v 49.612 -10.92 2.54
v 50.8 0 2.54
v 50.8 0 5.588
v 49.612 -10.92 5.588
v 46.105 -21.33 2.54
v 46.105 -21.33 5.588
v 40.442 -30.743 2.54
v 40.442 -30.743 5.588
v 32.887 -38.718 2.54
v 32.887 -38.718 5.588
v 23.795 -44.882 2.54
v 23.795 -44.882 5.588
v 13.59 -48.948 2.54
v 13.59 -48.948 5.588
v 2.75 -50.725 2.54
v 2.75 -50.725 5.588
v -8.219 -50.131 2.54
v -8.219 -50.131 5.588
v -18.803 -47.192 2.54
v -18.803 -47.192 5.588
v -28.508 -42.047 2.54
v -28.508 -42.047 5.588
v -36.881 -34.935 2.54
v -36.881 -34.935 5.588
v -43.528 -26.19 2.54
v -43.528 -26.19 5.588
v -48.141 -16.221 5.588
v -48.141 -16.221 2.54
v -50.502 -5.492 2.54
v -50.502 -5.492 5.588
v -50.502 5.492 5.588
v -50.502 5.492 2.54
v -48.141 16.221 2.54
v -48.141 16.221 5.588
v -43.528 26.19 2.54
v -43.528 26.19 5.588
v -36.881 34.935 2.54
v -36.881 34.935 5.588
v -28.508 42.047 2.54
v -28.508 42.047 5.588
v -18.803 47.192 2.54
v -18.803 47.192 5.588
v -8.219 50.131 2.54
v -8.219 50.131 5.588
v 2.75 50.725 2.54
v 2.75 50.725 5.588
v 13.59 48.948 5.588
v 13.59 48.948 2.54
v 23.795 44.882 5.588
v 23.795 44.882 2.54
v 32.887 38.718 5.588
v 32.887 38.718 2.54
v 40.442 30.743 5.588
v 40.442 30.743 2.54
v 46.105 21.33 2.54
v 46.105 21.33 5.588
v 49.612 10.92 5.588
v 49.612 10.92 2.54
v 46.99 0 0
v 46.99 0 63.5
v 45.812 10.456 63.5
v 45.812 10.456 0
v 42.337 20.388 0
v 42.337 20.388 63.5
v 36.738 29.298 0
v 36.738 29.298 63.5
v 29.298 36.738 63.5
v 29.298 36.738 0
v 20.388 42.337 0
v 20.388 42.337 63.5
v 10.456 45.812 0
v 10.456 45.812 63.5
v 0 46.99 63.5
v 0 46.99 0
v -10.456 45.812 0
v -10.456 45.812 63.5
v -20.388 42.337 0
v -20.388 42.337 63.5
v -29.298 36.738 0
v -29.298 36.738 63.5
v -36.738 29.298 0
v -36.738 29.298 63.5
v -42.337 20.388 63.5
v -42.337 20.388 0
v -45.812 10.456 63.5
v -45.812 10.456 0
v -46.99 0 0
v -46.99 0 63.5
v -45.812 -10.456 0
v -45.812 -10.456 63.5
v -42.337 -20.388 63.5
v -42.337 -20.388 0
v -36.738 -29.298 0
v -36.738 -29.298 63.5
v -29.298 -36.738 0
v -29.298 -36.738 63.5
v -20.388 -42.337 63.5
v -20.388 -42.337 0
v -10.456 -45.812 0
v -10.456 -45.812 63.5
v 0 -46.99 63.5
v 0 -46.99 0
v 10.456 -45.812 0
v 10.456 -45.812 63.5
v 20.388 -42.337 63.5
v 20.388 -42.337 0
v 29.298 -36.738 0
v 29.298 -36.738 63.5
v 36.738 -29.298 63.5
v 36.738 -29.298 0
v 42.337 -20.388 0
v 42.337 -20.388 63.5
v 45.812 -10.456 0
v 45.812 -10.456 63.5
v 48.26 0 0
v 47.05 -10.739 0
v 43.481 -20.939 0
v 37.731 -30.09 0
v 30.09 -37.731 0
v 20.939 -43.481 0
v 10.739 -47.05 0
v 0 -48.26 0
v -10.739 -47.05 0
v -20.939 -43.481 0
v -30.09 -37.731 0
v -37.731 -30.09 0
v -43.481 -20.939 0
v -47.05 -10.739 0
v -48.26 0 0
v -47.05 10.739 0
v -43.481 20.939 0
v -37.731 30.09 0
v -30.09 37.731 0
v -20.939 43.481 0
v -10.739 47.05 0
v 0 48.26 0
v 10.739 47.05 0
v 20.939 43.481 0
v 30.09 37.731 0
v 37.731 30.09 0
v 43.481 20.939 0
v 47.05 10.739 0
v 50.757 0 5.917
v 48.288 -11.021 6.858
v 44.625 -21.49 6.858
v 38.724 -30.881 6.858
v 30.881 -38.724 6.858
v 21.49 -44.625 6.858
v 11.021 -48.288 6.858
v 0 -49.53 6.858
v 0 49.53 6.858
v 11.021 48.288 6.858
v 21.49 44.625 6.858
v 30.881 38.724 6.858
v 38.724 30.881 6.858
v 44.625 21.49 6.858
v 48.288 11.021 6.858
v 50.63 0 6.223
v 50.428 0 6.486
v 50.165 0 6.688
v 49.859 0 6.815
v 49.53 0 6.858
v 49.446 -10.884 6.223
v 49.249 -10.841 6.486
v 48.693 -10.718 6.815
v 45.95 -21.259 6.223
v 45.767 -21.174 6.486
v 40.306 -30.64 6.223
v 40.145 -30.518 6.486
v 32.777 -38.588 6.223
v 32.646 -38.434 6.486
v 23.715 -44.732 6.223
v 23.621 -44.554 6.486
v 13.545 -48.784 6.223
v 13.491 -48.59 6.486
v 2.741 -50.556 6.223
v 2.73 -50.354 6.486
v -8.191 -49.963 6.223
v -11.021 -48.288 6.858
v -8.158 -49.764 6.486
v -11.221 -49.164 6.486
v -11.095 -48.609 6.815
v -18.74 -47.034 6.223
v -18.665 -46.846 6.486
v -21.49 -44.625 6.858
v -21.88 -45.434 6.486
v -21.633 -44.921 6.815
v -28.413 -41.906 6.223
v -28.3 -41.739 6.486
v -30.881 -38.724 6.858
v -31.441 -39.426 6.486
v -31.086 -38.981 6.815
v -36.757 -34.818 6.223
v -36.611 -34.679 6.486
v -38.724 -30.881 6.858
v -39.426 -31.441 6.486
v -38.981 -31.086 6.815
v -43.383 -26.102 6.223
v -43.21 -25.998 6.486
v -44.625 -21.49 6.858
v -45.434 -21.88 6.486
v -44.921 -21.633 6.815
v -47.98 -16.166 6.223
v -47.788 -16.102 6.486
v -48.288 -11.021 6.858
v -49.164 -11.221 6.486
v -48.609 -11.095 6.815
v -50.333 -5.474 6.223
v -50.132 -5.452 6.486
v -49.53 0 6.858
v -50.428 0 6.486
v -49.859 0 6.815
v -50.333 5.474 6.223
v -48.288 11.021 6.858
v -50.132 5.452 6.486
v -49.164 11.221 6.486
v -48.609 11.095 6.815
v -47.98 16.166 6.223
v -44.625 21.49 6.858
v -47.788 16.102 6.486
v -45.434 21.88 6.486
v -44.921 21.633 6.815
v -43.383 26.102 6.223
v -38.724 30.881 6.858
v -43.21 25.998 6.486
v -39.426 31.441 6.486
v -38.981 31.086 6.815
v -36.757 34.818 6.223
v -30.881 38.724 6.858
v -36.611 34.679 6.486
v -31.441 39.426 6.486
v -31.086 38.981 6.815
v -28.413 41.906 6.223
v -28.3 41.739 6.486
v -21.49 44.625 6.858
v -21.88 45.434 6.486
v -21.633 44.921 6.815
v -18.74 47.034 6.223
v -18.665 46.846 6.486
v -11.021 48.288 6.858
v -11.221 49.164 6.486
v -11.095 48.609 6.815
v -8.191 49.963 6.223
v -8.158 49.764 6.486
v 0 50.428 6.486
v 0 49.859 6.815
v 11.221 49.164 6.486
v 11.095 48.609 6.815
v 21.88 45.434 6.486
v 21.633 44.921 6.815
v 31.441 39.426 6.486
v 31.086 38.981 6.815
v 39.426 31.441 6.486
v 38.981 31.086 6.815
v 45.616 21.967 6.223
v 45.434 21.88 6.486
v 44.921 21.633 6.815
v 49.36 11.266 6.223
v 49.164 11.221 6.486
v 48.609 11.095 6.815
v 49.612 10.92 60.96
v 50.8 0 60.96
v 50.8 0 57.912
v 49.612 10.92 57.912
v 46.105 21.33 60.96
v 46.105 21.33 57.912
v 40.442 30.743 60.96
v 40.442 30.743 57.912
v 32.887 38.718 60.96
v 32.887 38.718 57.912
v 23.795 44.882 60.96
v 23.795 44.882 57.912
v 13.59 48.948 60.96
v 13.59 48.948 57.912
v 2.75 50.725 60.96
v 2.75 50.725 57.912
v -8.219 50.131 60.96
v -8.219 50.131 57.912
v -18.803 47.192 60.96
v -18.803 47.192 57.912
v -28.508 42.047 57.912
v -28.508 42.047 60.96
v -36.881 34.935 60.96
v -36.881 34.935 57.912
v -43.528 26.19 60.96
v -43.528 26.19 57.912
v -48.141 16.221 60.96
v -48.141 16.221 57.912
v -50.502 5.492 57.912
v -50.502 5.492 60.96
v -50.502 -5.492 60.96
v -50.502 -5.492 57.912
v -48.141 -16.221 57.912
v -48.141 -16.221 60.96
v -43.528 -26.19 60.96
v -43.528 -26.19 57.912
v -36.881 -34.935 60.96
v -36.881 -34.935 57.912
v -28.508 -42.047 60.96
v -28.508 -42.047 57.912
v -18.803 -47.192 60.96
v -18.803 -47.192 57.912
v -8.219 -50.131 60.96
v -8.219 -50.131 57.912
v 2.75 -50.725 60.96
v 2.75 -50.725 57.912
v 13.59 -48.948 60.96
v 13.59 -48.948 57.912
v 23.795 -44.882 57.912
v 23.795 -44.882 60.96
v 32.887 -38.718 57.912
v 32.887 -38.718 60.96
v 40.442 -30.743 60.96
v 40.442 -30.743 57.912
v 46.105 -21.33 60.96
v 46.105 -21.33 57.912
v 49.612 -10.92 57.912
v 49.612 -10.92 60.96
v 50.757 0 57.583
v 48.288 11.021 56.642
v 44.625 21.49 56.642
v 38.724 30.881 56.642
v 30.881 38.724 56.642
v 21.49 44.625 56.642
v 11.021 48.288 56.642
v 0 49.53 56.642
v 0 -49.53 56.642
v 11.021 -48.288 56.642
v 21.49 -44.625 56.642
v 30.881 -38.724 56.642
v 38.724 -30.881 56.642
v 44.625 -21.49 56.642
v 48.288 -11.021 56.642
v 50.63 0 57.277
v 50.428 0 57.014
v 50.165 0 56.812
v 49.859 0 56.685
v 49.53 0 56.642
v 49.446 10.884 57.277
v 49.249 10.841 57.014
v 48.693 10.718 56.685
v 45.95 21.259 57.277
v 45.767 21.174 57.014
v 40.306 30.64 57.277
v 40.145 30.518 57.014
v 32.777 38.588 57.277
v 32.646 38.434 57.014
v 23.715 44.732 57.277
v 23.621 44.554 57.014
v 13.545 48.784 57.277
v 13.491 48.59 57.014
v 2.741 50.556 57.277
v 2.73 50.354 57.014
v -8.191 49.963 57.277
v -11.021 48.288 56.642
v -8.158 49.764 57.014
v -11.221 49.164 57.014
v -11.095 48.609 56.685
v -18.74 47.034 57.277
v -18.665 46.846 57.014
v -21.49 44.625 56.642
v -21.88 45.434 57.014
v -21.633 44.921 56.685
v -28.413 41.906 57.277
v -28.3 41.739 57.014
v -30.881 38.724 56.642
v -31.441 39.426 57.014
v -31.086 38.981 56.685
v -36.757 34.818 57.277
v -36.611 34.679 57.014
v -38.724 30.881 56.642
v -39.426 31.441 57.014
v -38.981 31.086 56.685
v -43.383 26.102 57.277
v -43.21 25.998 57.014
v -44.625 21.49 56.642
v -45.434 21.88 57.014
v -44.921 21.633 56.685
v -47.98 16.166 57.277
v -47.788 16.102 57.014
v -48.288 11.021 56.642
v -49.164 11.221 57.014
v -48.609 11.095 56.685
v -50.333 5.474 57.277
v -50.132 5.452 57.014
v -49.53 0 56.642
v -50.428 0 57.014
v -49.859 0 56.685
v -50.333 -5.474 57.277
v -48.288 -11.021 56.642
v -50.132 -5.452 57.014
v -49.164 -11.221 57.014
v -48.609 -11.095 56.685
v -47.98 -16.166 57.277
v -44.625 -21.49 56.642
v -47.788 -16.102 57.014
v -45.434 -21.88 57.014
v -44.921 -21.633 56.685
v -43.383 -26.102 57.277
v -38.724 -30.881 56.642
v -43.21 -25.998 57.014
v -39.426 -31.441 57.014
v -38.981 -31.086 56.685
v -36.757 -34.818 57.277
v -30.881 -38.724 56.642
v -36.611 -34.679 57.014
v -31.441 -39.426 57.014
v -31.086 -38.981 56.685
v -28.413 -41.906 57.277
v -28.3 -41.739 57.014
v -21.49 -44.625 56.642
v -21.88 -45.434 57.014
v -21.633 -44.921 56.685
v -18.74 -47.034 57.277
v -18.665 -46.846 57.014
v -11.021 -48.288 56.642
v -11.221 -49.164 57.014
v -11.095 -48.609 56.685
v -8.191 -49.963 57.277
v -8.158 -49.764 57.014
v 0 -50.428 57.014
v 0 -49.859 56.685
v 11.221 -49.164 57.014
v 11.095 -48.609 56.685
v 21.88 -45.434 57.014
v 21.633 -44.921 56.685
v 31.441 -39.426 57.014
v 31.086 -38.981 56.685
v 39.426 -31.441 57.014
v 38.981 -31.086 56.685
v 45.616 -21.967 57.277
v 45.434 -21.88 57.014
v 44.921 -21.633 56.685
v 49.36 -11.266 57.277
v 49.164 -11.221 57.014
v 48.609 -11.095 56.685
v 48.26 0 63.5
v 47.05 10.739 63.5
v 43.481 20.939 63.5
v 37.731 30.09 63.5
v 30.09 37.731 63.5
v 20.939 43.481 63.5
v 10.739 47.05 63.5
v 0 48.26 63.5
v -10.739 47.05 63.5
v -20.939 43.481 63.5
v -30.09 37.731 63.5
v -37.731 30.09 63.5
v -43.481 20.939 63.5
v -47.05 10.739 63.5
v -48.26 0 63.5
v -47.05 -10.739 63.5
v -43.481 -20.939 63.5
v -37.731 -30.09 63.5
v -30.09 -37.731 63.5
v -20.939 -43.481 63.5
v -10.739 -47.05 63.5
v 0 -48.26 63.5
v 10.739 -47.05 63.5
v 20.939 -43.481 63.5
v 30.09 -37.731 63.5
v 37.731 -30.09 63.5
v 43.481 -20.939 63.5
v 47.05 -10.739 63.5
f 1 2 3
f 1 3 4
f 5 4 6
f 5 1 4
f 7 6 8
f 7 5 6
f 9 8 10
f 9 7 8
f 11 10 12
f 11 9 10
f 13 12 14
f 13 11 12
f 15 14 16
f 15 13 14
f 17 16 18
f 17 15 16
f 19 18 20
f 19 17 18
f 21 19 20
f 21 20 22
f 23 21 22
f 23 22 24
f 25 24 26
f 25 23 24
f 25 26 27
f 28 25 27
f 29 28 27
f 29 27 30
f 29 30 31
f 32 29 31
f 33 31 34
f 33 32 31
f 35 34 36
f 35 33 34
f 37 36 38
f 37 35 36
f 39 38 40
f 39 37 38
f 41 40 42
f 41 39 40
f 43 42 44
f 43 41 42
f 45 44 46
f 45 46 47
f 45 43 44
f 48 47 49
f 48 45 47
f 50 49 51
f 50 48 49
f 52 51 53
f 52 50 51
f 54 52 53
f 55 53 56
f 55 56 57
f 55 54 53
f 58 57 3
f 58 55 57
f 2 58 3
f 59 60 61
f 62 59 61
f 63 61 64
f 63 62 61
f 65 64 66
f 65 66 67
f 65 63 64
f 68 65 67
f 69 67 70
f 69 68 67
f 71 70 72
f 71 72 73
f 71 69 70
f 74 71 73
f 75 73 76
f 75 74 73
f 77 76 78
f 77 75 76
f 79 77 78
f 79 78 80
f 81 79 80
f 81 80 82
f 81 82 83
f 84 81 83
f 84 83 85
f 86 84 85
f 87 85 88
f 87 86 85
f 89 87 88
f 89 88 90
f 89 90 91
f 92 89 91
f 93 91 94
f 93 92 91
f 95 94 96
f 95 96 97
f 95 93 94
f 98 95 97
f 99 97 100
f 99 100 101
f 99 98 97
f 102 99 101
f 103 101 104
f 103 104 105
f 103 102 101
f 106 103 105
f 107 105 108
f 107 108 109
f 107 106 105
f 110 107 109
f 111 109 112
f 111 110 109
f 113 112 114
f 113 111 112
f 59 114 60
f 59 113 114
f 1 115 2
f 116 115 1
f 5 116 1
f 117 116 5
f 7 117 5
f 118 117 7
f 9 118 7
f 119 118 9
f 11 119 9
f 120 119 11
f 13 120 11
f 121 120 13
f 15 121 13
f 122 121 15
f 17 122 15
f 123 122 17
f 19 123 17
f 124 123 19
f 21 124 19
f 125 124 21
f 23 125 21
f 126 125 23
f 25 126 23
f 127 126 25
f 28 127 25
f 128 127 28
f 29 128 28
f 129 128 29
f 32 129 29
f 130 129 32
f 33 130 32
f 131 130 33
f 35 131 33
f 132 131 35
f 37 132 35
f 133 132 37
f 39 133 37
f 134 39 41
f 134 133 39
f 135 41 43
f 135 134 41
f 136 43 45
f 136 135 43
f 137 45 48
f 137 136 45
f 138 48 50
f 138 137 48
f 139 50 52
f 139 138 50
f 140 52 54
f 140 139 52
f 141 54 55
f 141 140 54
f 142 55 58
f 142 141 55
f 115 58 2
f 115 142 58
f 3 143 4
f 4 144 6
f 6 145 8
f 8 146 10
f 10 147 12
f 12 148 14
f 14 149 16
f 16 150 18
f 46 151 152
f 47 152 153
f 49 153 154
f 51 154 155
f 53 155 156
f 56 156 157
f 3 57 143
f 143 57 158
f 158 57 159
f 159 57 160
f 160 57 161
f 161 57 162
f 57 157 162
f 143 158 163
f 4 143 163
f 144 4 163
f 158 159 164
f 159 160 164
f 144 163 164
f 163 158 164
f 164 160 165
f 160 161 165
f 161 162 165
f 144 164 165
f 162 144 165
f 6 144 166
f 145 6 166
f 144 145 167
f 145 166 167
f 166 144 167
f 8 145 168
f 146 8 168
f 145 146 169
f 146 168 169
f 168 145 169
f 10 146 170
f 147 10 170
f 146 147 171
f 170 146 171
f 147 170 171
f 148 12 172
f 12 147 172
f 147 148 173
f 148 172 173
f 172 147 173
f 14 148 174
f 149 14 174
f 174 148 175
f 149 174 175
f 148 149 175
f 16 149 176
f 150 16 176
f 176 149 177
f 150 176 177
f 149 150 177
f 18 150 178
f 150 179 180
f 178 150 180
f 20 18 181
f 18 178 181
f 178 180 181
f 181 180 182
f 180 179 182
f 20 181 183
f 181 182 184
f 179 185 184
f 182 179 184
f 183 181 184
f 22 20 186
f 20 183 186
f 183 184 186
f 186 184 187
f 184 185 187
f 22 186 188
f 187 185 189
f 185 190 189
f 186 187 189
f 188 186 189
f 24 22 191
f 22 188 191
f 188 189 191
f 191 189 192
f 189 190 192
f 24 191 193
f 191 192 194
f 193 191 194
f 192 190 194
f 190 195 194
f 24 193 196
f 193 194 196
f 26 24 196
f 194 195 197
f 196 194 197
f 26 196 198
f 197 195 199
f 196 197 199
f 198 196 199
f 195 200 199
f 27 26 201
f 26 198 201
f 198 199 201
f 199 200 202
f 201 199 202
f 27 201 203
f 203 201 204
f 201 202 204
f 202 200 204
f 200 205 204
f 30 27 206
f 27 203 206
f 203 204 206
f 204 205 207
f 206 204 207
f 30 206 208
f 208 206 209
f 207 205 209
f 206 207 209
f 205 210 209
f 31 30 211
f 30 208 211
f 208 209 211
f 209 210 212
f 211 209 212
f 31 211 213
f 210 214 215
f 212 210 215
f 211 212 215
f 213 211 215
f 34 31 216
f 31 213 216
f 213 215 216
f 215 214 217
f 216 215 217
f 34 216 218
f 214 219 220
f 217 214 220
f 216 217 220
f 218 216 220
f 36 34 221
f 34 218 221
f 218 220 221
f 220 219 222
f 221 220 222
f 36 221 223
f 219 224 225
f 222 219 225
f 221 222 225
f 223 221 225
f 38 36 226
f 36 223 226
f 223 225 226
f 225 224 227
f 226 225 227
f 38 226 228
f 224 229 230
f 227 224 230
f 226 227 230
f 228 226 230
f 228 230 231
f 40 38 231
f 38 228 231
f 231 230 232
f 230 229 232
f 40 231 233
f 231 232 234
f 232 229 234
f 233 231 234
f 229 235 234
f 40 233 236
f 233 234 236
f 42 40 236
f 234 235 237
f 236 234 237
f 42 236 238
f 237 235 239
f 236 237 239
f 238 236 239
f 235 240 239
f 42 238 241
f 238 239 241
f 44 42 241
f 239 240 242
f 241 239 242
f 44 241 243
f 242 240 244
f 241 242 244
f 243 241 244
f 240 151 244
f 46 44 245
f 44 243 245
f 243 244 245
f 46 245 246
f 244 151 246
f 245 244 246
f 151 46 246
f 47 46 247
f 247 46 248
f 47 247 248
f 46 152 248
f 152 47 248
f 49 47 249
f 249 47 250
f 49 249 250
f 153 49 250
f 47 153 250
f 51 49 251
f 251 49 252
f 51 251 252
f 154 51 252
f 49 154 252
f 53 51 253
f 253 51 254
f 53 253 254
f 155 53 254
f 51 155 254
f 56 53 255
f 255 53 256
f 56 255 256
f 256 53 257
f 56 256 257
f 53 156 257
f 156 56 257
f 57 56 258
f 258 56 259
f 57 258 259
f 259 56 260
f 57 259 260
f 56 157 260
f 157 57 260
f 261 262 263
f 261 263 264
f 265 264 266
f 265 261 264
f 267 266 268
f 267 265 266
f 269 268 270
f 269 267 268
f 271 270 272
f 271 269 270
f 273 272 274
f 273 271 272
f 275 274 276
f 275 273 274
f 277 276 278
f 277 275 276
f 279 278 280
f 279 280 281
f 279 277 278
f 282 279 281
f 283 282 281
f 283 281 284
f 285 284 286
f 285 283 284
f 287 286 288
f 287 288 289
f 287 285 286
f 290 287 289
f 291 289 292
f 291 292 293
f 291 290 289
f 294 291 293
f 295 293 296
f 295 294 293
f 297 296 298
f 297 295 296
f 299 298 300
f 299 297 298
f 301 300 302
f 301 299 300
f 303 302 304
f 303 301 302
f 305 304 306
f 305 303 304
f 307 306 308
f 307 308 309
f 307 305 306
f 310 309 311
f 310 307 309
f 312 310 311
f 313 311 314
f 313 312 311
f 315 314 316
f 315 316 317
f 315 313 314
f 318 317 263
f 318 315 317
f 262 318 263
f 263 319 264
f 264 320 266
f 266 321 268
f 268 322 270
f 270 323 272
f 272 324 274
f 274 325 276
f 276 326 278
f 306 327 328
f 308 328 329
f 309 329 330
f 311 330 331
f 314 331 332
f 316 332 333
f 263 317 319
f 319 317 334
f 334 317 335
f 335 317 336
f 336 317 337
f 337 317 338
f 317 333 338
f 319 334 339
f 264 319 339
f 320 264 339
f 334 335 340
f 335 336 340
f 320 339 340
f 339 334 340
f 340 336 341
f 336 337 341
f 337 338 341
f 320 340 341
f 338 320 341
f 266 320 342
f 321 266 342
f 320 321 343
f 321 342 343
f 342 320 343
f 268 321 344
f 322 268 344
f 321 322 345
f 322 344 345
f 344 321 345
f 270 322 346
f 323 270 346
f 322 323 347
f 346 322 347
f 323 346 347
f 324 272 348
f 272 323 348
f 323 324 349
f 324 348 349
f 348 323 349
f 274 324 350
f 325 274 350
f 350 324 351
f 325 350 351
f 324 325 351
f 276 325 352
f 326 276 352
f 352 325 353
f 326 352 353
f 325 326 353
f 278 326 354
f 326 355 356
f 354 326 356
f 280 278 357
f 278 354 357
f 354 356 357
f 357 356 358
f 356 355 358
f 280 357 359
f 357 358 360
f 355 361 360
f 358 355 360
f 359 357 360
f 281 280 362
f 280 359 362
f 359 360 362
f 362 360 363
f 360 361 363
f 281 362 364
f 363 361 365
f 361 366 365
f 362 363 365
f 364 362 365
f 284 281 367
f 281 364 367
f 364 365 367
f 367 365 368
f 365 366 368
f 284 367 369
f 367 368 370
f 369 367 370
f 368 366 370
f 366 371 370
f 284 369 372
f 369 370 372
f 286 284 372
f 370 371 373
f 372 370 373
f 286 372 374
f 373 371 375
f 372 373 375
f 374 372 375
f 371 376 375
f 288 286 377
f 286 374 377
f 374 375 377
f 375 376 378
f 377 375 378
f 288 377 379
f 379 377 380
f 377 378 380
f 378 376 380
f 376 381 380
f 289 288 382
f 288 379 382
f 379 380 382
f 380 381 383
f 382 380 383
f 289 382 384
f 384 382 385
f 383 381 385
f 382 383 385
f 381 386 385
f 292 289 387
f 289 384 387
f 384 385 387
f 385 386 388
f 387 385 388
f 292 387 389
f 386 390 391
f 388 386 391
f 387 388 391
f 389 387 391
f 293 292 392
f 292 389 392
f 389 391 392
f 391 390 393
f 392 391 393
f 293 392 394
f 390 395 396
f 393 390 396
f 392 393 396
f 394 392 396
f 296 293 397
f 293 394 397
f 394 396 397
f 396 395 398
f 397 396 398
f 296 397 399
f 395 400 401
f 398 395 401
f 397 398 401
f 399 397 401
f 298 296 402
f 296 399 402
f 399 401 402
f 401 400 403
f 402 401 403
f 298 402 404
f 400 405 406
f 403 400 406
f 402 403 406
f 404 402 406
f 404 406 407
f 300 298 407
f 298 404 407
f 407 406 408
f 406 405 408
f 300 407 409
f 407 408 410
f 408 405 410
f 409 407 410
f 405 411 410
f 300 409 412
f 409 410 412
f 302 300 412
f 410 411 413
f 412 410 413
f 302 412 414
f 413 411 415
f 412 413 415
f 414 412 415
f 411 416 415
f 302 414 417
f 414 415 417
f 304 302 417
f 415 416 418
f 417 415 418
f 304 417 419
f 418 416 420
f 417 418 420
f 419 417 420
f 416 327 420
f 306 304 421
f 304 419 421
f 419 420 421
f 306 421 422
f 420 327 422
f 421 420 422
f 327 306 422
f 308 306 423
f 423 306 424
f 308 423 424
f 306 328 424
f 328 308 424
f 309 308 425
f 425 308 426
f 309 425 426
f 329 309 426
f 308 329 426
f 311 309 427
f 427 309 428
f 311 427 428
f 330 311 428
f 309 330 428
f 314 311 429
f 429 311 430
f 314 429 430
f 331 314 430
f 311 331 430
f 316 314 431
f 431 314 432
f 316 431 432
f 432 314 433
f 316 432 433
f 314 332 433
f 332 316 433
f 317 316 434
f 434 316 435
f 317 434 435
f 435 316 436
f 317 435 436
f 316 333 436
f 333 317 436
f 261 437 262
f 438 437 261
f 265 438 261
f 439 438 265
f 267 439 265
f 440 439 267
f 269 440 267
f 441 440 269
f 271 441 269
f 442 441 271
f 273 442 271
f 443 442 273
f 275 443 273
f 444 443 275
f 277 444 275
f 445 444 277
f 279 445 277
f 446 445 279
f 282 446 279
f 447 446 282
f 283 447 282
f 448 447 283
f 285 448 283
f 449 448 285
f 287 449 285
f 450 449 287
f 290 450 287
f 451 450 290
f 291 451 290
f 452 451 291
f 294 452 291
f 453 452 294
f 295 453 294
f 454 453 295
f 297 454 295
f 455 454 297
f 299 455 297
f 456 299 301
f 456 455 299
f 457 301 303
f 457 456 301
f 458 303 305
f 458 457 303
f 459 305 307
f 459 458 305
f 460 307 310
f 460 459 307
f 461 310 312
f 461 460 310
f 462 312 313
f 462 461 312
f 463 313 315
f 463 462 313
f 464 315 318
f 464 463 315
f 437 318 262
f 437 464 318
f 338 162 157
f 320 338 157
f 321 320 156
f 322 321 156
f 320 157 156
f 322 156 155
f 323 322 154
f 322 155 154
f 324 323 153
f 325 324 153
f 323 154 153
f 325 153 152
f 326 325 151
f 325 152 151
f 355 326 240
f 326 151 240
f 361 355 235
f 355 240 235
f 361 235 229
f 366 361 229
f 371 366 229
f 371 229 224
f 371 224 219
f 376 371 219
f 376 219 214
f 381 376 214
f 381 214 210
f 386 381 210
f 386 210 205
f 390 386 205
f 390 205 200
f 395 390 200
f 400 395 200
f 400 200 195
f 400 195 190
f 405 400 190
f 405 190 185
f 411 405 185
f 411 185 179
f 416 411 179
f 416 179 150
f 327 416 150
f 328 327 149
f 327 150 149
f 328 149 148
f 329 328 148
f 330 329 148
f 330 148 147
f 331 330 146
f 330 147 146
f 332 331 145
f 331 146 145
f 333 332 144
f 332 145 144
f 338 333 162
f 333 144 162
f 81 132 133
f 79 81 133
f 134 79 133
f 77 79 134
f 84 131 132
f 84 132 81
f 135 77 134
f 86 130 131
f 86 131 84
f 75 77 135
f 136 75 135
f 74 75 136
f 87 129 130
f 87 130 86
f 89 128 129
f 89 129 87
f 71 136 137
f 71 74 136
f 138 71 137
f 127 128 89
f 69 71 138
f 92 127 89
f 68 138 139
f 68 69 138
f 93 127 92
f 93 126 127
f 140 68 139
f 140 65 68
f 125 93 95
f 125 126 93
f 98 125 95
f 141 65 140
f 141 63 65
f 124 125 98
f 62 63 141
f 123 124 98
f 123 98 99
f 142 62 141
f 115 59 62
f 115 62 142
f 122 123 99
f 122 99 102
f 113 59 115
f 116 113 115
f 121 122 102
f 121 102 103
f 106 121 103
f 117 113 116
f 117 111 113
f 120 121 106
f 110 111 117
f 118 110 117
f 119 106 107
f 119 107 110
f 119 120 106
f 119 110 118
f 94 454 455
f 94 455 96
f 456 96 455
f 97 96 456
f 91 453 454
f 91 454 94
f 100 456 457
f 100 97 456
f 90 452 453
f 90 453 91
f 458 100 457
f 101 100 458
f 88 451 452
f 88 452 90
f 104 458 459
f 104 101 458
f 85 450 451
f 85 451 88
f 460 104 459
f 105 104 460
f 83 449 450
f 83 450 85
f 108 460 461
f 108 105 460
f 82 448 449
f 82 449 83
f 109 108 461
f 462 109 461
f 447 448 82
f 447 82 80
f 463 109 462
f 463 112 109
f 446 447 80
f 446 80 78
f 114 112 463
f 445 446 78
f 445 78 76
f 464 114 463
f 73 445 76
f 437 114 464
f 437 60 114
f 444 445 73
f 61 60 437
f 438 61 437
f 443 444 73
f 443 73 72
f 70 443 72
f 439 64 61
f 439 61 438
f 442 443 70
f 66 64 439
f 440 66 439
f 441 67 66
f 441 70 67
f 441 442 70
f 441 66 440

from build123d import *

# Parameters (mm, degrees)
F0_R     = 49.53
F0_R_2   = 46.99
F1_DEPTH = 63.5
F2_R     = 50.8
F2_R_2   = 49.53
F3_DEPTH = 6.858
F4_SIZE  = 2.54
F5_R     = 1.26999
F6_R     = 50.8
F6_R_2   = 49.53
F7_DEPTH = 6.858
F8_SIZE  = 2.54
F9_R     = 1.26999


# Not quite as in the source:
# - a fillet or chamfer is up to 0.001 mm smaller than in the source, because OpenCascade refuses the exact size


with BuildPart() as f1:
    # F0 (on Top) → F1 (new body)
    with BuildSketch(Plane.XY):
        Circle(F0_R)
        Circle(F0_R_2, mode=Mode.SUBTRACT)
    extrude(amount=F1_DEPTH)

    # F2 (on face) → F3 (join)
    with BuildSketch(Plane.XY.offset(63.5)):
        Circle(F2_R)
        Circle(F2_R_2, mode=Mode.SUBTRACT)
    extrude(amount=-F3_DEPTH)

    # F4
    f4_edges = [f1.edges().sort_by_distance(p)[0] for p in [
        (-50.8, 0, 63.5),
    ]]
    chamfer(f4_edges, length=F4_SIZE)

    # F5 (radius 1.27 in the source; OpenCascade refuses exactly that, so slightly less here)
    f5_edges = [f1.edges().sort_by_distance(p)[0] for p in [
        (-50.8, 0, 56.642),
    ]]
    fillet(f5_edges, radius=F5_R)

    # F6 (on face) → F7 (join)
    with BuildSketch(Plane(origin=(0, 0, 0), x_dir=(1, 0, 0), z_dir=(0, 0, -1))):
        Circle(F6_R)
        Circle(F6_R_2, mode=Mode.SUBTRACT)
    extrude(amount=-F7_DEPTH)

    # F8
    f8_edges = [f1.edges().sort_by_distance(p)[0] for p in [
        (-50.8, 0, 0),
    ]]
    chamfer(f8_edges, length=F8_SIZE)

    # F9 (radius 1.27 in the source; OpenCascade refuses exactly that, so slightly less here)
    f9_edges = [f1.edges().sort_by_distance(p)[0] for p in [
        (-50.8, 0, 6.858),
    ]]
    fillet(f9_edges, radius=F9_R)


solid = f1.part
